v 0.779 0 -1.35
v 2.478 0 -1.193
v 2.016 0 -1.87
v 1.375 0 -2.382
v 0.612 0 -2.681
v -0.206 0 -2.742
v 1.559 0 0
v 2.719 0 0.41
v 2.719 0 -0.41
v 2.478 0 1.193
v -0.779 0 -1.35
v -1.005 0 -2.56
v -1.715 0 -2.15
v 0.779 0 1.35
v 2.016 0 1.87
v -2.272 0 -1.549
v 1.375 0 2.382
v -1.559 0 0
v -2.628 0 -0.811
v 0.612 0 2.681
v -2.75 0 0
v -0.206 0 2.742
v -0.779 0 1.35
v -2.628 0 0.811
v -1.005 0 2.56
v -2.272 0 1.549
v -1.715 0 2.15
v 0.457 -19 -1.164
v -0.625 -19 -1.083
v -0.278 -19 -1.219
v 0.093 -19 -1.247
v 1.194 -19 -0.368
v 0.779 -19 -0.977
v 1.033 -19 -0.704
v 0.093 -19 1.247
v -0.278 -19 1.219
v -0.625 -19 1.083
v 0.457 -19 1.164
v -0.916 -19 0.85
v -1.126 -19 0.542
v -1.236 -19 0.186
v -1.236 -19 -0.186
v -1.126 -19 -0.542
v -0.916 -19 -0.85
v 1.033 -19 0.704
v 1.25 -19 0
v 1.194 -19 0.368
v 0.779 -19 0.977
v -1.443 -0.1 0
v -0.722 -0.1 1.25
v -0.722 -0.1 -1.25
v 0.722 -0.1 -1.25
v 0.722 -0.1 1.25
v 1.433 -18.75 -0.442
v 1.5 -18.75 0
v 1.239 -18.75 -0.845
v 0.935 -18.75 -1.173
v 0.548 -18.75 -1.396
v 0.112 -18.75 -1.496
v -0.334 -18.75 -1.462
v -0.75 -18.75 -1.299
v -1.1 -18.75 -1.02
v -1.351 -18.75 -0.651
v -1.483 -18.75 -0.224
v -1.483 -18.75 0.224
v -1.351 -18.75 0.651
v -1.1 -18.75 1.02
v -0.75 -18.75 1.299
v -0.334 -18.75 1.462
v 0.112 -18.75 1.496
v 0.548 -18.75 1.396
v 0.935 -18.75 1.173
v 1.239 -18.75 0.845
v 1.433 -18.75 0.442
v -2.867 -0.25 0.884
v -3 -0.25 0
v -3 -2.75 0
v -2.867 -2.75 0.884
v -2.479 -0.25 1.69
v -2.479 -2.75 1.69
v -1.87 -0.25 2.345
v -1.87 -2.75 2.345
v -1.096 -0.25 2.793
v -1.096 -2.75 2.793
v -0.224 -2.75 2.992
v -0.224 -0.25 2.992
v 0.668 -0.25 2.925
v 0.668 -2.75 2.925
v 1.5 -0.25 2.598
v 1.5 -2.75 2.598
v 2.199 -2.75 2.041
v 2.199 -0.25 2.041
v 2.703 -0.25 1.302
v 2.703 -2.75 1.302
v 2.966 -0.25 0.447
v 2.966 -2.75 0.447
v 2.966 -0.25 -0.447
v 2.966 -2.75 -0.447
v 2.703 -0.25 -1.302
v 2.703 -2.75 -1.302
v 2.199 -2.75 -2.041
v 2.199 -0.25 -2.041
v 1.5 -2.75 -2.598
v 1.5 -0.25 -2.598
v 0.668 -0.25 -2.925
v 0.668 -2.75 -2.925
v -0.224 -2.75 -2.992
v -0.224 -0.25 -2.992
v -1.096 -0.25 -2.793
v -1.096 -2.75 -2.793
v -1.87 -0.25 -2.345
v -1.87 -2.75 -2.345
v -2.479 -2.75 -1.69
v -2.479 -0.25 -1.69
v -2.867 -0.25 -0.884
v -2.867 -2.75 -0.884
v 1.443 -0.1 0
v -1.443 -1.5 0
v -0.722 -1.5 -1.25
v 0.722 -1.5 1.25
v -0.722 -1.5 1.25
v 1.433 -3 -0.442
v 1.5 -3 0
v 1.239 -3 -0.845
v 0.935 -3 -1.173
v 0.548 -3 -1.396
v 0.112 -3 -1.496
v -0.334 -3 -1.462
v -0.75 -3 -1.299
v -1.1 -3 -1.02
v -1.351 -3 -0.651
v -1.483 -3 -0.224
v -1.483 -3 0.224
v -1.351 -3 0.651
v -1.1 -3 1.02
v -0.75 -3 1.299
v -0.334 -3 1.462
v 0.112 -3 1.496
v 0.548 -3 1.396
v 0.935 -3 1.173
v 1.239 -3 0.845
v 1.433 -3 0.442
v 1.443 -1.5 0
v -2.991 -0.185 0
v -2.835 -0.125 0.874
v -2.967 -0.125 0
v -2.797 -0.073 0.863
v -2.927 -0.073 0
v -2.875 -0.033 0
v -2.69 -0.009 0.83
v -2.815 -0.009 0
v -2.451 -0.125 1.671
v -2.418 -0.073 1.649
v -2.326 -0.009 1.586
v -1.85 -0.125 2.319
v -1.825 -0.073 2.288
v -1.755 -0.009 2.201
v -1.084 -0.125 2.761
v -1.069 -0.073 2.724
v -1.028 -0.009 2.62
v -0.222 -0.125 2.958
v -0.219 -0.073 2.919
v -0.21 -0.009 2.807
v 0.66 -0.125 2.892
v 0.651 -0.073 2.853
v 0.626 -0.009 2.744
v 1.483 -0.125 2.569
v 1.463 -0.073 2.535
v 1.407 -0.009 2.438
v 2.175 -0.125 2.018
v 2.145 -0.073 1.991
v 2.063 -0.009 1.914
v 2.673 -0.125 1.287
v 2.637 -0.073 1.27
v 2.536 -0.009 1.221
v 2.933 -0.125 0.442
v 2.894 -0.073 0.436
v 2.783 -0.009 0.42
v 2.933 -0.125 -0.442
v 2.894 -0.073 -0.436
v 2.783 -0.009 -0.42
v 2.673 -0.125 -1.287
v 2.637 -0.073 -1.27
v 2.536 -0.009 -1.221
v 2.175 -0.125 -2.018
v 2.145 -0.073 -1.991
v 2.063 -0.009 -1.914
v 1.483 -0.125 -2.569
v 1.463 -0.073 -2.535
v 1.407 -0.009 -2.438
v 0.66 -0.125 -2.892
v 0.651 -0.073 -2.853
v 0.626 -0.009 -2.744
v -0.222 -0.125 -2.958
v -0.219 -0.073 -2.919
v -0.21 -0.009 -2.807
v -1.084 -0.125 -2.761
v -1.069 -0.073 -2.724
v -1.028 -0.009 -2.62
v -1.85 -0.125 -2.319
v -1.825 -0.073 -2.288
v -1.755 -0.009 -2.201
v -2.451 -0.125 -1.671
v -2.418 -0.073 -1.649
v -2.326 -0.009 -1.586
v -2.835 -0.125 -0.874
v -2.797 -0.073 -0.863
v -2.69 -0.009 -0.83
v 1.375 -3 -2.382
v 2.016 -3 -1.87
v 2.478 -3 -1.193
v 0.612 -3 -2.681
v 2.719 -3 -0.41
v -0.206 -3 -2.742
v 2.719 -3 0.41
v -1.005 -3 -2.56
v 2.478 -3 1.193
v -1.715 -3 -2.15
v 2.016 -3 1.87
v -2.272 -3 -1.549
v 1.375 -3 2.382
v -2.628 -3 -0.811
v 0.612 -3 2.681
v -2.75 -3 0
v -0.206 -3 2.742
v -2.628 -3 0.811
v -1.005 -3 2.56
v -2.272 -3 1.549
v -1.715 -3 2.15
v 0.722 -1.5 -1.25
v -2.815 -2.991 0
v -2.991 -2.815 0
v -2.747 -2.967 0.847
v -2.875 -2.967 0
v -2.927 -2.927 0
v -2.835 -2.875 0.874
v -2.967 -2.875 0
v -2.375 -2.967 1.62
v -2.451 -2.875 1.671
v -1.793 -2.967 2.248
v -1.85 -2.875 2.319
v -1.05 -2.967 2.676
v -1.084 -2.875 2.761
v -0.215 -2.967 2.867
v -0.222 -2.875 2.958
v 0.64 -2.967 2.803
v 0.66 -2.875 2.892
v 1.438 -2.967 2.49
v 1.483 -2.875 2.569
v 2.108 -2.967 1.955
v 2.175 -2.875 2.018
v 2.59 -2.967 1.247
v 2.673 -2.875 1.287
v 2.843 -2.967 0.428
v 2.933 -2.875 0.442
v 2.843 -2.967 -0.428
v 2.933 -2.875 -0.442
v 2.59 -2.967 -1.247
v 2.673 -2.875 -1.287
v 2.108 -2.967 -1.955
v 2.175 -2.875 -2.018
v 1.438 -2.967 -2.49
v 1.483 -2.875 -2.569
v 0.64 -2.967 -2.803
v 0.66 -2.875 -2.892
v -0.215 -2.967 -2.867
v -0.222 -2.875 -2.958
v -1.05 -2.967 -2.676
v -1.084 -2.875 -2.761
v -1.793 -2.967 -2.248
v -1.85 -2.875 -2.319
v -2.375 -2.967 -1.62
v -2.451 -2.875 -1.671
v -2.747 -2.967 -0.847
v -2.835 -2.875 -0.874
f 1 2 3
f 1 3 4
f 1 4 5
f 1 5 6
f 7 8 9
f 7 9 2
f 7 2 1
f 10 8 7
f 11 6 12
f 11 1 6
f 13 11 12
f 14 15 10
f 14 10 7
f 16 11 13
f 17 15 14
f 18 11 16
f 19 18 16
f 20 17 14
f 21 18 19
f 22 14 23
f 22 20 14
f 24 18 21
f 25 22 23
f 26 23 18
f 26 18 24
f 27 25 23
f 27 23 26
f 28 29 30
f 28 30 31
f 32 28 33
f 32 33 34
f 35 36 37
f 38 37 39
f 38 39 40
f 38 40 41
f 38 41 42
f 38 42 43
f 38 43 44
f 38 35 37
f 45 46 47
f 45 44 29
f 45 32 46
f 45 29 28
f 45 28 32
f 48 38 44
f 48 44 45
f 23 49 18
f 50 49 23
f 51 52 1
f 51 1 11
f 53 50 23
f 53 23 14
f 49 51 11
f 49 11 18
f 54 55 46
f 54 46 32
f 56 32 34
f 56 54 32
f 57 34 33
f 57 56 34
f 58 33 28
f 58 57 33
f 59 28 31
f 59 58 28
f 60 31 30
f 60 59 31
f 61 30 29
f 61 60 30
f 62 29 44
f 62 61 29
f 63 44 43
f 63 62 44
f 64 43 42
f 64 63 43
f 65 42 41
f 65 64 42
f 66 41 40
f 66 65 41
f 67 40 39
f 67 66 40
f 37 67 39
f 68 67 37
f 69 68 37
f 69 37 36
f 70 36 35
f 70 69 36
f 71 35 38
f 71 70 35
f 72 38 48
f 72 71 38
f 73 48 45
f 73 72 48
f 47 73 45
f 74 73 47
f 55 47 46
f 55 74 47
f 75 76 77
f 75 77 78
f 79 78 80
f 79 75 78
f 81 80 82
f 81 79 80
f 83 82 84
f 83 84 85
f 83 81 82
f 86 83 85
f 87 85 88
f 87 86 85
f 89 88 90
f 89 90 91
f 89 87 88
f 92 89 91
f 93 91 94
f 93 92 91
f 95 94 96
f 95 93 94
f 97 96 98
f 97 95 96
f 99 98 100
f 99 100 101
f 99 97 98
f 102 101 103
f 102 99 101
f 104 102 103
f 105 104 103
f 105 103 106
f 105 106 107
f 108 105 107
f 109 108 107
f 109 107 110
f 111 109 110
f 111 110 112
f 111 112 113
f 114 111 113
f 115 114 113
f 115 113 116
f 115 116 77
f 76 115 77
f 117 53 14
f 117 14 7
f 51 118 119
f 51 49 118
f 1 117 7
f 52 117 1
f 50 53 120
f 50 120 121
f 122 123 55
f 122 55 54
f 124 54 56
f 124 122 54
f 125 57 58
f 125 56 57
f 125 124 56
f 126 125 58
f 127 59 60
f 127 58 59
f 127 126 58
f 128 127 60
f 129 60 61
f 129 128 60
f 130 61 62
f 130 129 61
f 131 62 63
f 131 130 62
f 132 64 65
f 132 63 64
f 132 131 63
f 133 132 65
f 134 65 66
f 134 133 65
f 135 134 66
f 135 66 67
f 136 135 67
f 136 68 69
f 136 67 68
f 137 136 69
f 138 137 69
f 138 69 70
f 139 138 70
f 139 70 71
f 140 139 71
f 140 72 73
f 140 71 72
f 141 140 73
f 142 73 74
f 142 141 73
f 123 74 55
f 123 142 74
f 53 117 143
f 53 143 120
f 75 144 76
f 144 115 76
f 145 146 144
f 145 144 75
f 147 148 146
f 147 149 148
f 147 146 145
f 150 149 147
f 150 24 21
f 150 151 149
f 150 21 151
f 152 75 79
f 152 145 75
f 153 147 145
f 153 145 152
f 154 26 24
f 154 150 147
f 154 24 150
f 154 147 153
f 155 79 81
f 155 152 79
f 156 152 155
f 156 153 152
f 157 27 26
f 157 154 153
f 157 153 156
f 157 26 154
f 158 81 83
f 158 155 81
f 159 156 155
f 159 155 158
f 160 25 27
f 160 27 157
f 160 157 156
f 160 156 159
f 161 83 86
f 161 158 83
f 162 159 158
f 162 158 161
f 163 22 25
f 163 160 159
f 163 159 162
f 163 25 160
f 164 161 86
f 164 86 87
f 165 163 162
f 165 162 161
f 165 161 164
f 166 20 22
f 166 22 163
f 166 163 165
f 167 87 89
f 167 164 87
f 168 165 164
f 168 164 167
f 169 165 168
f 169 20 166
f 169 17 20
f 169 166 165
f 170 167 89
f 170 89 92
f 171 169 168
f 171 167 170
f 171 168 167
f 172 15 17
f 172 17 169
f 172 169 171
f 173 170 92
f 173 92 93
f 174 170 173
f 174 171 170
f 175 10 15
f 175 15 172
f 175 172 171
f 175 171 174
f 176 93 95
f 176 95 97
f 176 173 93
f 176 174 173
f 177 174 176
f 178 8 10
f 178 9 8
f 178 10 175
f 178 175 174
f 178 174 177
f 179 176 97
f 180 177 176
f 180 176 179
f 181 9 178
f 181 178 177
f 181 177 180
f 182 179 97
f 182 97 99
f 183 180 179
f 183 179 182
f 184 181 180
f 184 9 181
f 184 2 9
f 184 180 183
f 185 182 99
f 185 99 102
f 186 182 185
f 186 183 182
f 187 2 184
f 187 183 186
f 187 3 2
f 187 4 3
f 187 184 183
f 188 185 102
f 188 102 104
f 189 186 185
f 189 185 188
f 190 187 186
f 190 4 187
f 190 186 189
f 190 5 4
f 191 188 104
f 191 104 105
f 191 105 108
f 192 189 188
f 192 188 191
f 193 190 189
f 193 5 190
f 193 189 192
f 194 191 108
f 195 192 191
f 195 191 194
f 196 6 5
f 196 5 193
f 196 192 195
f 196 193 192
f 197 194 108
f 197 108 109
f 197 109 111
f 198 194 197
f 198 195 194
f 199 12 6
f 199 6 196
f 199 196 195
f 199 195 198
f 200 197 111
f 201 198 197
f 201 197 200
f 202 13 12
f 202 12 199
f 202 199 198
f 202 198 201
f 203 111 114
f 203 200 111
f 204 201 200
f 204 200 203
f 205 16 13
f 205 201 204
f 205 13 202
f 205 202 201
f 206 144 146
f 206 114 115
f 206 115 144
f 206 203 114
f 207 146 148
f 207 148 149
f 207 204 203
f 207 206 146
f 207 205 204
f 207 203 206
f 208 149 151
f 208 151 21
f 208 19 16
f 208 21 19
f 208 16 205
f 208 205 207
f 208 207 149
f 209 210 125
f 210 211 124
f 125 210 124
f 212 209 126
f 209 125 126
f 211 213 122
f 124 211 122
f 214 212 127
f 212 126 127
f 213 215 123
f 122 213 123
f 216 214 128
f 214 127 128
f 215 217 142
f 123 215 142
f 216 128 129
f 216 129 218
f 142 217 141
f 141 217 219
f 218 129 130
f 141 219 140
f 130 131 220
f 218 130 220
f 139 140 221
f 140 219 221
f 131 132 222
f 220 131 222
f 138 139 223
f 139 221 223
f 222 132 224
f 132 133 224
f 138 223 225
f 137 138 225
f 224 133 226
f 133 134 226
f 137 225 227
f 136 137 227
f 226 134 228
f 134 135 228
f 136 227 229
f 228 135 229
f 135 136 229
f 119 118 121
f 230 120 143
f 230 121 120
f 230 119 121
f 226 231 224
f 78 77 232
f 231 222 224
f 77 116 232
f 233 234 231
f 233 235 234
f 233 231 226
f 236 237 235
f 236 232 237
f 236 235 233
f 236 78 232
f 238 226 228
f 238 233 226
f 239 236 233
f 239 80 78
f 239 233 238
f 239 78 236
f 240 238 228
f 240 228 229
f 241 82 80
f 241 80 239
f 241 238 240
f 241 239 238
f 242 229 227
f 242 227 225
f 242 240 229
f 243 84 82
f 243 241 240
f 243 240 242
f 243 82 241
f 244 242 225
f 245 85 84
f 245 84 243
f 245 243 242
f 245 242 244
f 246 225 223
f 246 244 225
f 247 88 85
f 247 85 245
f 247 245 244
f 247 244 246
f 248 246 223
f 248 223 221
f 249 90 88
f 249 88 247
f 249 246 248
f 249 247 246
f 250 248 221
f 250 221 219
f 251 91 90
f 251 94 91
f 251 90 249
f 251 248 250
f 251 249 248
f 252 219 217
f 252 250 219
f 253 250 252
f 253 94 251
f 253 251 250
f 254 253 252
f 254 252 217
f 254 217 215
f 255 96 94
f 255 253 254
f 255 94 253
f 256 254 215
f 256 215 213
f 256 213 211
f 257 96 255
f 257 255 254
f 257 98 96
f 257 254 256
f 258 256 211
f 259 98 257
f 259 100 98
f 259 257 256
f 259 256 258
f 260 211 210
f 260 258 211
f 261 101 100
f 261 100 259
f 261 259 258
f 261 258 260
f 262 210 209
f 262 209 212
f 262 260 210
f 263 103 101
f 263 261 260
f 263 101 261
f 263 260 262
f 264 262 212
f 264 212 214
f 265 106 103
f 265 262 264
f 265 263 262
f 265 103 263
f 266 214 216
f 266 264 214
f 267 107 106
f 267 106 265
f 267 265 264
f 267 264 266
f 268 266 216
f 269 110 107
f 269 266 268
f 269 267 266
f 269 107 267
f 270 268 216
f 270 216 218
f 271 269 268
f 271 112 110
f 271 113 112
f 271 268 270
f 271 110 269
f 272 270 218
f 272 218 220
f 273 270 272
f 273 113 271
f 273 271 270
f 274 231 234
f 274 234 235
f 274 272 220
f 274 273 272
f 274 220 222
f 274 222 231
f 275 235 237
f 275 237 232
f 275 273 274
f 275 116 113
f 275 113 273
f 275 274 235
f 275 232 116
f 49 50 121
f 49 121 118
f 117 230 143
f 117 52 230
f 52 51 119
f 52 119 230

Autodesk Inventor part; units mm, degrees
ref_plane "YZ Plane" through (0, 0, 0) normal (1, 0, 0) x (0, 1, 0)
ref_plane "XZ Plane" through (0, 0, 0) normal (0, 1, 0) x (-1, 0, 0)
ref_plane "XY Plane" through (0, 0, 0) normal (0, 0, 1) x (1, 0, 0)
sketch "Sketch1" plane through (0, 0, 0) normal (0, 1, 0) x (-1, 0, 0)
  circle A0 centre (0, 0) radius 3
  dimension "d0" = 6
extrude "Extrusion1" add sketch "Sketch1" against normal blind 3
sketch "Sketch2" plane through (0, -3, 0) normal (0, -1, 0) x (1, 0, 0)
  circle A0 centre (0, 0) radius 1.5
  dimension "d3" = 3
extrude "Extrusion2" add sketch "Sketch2" along normal blind 16
sketch "Sketch3" plane through (0, 0, 0) normal (0, 1, 0) x (1, 0, 0)
  circle A0 centre (0, 0) radius 1.5 construction
  line L0 (1.4434, 0) -> (0.7217, -1.25)
  line L1 (0.7217, -1.25) -> (-0.7217, -1.25)
  line L2 (-0.7217, -1.25) -> (-1.4434, 0)
  line L3 (-1.4434, 0) -> (-0.7217, 1.25)
  line L4 (-0.7217, 1.25) -> (0.7217, 1.25)
  line L5 (0.7217, 1.25) -> (1.4434, 0)
  dimension "d8" = 2.5
extrude "Extrusion3" cut sketch "Sketch3" against normal blind 1.5
chamfer "Chamfer1" distance 0.25 angle 45 1 edges at (-1.5, -19, 0)
fillet "Fillet1" radius 0.25 2 edges at (3, 0, 0) (3, -3, 0)
chamfer "Chamfer2" distance 0.1 angle 45 6 edges at (0, 0, -1.25) (1.0825, 0, -0.625) (1.0825, 0, 0.625) (0, 0, 1.25) (-1.0825, 0, 0.625) (-1.0825, 0, -0.625)
thread "Thread2" size "M3x0.5" class "6g" standard "ANSI Metric M Profile" full length
properties part number "M3-16" material "Steel, Carbon"
